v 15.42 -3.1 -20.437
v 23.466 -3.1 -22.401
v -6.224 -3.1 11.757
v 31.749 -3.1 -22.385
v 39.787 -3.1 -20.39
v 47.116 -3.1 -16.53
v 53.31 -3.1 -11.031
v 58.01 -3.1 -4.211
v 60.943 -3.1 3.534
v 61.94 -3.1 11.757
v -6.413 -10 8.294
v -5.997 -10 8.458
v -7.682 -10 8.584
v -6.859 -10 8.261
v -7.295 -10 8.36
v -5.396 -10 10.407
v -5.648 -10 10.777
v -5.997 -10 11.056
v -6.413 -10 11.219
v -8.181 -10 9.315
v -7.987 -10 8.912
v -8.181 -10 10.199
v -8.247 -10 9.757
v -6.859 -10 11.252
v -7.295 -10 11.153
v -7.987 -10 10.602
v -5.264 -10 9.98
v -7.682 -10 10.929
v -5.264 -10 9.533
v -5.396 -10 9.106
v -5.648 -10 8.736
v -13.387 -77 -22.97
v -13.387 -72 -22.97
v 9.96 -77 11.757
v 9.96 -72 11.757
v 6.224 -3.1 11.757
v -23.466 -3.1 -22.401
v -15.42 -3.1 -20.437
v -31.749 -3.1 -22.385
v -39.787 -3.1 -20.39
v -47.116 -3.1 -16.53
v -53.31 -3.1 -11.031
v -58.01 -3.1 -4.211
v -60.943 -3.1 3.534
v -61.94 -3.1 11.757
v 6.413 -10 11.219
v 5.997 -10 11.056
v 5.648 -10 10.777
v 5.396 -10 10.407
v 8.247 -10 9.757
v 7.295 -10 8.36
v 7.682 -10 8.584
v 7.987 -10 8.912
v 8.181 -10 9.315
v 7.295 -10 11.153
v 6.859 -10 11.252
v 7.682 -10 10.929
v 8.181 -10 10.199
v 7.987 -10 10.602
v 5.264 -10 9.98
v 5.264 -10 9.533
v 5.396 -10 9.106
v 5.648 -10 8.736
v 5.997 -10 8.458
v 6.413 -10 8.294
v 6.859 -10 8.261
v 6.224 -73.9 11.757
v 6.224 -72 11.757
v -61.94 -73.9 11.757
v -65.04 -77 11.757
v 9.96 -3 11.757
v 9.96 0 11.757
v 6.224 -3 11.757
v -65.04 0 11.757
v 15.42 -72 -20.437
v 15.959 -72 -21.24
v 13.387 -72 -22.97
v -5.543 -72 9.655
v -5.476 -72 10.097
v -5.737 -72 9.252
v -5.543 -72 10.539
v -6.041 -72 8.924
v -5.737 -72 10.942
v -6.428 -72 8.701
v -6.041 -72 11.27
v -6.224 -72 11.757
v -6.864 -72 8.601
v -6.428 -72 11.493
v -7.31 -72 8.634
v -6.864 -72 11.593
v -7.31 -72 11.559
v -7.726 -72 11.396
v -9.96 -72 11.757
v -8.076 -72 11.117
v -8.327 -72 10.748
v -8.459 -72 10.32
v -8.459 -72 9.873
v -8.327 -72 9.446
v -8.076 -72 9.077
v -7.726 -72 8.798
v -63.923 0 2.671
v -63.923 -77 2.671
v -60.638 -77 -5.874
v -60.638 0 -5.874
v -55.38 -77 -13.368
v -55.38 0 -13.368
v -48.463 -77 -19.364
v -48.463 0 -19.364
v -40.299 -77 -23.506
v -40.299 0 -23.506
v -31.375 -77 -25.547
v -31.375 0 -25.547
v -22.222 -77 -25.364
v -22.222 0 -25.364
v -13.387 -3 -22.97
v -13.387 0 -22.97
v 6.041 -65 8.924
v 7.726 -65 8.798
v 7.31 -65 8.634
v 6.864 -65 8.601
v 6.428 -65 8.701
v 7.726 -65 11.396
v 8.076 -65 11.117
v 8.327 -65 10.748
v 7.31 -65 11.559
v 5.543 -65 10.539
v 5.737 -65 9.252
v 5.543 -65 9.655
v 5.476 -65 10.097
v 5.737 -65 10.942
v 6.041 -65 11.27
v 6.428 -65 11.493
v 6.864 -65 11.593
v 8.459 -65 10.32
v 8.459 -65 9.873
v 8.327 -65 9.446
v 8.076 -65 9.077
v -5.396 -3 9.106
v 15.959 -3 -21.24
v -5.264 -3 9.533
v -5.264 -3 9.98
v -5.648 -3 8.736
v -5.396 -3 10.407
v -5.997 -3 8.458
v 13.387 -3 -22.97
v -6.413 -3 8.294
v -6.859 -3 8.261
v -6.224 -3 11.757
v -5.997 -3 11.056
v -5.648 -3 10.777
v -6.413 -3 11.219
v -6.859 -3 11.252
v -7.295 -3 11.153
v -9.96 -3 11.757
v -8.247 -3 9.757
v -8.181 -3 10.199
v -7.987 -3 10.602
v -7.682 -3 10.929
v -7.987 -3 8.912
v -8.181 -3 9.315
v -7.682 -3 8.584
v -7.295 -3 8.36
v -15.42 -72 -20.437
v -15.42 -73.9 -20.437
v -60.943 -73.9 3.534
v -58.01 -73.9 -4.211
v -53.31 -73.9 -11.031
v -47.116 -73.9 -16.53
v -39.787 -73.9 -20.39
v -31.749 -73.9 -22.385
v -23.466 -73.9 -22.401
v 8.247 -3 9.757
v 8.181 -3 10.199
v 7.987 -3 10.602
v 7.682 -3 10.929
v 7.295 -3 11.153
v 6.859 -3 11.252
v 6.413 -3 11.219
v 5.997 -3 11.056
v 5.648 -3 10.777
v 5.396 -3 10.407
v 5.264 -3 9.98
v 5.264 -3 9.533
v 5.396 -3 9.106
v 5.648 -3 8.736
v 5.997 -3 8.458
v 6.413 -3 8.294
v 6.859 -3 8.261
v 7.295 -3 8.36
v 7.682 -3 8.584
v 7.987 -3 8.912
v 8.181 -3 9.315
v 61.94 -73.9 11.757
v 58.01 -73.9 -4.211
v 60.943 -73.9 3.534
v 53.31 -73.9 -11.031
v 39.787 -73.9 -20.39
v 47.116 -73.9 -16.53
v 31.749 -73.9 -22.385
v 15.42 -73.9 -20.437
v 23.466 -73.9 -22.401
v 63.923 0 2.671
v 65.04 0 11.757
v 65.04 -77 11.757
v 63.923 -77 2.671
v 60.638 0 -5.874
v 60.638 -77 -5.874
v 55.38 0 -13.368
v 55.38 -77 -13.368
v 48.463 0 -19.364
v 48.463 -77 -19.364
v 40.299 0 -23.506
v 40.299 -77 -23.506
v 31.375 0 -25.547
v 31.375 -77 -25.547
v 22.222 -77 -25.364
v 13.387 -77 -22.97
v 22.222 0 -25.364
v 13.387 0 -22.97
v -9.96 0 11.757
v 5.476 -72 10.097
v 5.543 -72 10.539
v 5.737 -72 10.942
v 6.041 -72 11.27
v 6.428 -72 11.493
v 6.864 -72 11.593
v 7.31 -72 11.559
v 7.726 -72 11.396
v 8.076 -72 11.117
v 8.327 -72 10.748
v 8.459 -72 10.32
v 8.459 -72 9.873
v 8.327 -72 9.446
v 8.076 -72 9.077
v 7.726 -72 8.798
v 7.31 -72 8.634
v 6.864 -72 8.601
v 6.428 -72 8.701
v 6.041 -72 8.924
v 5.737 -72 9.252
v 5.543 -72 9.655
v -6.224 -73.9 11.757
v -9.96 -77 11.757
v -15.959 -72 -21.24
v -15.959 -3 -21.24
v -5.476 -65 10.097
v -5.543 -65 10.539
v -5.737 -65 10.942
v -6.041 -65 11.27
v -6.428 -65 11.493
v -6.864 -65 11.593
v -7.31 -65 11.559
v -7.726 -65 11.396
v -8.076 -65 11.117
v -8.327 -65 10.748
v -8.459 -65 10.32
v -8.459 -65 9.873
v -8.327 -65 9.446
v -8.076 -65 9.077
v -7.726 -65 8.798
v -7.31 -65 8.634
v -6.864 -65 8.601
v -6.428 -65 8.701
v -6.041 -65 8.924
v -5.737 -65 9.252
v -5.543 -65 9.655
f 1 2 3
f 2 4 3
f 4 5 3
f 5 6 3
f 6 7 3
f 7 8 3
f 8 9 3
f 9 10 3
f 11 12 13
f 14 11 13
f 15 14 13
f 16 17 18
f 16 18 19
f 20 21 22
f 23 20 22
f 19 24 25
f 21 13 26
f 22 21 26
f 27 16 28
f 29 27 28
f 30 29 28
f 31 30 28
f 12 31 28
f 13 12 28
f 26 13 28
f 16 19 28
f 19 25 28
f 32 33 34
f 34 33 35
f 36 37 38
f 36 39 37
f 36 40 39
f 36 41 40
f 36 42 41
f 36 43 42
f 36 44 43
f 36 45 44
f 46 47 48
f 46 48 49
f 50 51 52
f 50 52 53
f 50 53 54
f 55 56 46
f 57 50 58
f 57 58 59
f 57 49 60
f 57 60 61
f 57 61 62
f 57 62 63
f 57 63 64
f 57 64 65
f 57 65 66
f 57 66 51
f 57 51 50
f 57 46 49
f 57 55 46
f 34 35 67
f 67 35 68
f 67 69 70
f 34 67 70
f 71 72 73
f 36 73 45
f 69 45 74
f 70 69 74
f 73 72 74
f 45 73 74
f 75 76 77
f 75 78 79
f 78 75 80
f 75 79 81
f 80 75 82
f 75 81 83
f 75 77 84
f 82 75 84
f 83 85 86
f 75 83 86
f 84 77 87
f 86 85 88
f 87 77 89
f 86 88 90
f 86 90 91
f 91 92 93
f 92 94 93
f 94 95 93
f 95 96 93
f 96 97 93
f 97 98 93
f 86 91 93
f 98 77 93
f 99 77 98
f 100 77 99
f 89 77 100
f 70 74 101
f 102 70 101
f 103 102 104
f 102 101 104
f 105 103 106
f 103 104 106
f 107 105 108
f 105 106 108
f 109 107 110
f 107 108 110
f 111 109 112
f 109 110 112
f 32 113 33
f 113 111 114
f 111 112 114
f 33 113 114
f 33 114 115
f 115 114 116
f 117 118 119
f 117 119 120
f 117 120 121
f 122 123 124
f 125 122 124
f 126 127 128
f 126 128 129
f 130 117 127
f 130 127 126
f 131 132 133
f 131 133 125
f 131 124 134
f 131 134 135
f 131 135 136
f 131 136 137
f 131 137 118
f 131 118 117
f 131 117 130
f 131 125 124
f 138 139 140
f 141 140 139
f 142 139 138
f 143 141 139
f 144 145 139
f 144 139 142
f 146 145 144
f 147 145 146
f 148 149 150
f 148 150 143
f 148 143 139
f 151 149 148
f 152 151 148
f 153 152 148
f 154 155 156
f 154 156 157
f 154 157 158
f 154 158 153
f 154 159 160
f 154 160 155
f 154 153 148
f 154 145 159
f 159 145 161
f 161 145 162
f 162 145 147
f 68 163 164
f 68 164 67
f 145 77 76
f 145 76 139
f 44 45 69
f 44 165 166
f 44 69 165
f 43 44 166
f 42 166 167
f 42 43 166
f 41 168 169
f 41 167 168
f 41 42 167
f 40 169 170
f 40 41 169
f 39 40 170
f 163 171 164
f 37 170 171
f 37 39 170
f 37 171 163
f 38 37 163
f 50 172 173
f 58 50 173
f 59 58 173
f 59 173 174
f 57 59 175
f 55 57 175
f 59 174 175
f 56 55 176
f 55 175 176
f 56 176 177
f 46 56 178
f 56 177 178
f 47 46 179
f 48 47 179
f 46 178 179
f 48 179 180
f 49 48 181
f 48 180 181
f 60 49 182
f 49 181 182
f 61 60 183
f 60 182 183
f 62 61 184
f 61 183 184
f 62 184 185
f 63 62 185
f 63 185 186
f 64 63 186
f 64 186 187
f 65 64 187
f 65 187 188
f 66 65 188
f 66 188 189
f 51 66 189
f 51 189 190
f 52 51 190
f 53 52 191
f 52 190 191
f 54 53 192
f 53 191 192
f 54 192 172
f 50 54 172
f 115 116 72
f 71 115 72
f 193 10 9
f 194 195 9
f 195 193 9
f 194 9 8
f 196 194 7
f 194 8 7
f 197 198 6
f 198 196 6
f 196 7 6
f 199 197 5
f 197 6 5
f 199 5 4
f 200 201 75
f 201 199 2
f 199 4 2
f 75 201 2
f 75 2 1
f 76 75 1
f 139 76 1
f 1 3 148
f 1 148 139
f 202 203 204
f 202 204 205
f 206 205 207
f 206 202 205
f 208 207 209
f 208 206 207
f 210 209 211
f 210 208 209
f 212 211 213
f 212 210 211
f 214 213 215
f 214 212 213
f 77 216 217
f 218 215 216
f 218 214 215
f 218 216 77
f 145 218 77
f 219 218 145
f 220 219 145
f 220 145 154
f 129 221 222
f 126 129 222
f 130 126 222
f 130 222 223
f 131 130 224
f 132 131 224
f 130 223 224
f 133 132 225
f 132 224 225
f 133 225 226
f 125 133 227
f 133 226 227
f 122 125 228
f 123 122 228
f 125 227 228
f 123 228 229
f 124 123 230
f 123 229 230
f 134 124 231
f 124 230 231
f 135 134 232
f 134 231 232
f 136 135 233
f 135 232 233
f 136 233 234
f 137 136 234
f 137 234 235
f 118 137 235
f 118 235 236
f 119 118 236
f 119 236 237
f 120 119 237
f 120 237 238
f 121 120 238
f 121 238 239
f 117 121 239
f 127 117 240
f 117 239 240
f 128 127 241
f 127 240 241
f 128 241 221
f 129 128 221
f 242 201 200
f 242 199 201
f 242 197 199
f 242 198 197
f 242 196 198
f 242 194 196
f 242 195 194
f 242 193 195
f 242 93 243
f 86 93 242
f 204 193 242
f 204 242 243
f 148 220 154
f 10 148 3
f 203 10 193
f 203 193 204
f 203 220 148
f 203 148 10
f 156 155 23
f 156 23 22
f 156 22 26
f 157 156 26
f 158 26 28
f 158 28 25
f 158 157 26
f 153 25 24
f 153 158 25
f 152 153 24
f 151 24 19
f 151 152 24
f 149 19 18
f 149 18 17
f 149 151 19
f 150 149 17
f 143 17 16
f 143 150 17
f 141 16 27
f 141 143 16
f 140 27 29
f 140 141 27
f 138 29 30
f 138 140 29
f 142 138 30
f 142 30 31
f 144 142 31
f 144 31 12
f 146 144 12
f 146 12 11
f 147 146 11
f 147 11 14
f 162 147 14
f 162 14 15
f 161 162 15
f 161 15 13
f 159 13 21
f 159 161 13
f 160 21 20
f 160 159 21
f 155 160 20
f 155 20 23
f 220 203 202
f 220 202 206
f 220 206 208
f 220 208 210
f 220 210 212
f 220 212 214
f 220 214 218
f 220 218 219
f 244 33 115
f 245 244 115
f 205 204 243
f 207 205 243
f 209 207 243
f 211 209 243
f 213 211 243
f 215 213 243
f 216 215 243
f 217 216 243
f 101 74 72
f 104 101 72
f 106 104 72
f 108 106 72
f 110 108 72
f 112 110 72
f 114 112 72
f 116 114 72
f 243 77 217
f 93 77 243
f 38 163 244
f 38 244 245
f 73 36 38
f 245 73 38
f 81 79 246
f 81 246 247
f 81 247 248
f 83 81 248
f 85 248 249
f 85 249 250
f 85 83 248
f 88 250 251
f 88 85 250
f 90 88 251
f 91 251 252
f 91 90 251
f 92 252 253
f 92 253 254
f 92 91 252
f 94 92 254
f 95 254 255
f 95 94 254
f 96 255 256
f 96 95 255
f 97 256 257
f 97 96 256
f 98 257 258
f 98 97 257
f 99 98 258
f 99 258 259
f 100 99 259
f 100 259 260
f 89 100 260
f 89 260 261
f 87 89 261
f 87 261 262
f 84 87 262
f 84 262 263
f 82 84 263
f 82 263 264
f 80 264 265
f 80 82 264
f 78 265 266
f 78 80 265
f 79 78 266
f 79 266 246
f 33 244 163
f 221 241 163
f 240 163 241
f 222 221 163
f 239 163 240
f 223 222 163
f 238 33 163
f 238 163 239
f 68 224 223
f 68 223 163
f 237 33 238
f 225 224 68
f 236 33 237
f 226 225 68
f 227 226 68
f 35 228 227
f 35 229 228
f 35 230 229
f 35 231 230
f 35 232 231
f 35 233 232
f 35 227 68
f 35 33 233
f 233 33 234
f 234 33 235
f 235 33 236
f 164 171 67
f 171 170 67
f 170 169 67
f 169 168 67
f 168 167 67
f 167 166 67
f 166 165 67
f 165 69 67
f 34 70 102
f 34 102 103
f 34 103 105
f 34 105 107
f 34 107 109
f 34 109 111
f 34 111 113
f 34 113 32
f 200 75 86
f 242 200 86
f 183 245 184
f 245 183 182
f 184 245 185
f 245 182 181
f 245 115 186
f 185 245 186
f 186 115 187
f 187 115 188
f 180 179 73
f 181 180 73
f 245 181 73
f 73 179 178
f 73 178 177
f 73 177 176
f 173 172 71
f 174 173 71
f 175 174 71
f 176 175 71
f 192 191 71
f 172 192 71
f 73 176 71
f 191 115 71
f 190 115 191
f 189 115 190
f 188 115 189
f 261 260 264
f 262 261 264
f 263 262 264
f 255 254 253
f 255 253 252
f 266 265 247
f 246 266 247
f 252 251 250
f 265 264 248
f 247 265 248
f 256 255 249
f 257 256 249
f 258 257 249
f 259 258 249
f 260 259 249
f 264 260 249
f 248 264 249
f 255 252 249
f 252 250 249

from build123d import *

# Parameters (mm, degrees)
F1_DEPTH = 77
F2_T     = -3.1
F3_W     = 69
F3_H     = 41.8446557946
F4_DEPTH = 3.1
F6_R     = 1.5
F7_DEPTH = 7
F5_R     = 1.5
F8_DEPTH = 7


with BuildPart() as f1:
    # F0 (on Front) → F1 (new body)
    with BuildSketch(Plane.XZ):
        with BuildLine():
            Line((-27.5404918939, 11.756635271), (-65.0404918939, 11.756635271))
            ThreePointArc((-65.0404918939, 11.756635271), (-48.4628197912, -19.3641969055), (-13.3868281415, -22.9697783415))
            Line((-13.3868281415, -22.9697783415), (9.9595081061, 11.756635271))
            Line((9.9595081061, 11.756635271), (-27.5404918939, 11.756635271))
        make_face()
    extrude(amount=F1_DEPTH)

    # F2
    f2_openings = [f1.faces().sort_by_distance(p)[0] for p in [
        (-27.540492, -38.5, 11.756635),
    ]]
    offset(amount=F2_T, openings=f2_openings)

    # F3 (on face) → F4 (cut)
    with BuildSketch(Plane(origin=(1.4157240499, 0, -0.9517818359), x_dir=(0, 1, 0), z_dir=(0.829888858, 0, -0.5579287439))):
        with Locations((-37.5, -5.6089314301)):
            Rectangle(F3_W, F3_H)
    extrude(amount=-F4_DEPTH, mode=Mode.SUBTRACT)

    # F6 (on face) → F7 (join)
    with BuildSketch(Plane.XZ.offset(3)):
        with Locations((6.7472014677, 9.756635271)):
            Circle(F6_R)
    extrude(amount=F7_DEPTH)

    # F5 (on face) → F8 (join)
    with BuildSketch(Plane(origin=(0, -72, 0), x_dir=(-1, 0, 0), z_dir=(0, 1, 0))):
        with Locations((-6.9759306399, 10.0968575549)):
            Circle(F5_R)
    extrude(amount=F8_DEPTH)


with BuildPart() as f9_1:
    # F9: instance of F1
    add(f1.part.mirror(Plane.YZ))


solid = Compound([f1.part, f9_1.part])
